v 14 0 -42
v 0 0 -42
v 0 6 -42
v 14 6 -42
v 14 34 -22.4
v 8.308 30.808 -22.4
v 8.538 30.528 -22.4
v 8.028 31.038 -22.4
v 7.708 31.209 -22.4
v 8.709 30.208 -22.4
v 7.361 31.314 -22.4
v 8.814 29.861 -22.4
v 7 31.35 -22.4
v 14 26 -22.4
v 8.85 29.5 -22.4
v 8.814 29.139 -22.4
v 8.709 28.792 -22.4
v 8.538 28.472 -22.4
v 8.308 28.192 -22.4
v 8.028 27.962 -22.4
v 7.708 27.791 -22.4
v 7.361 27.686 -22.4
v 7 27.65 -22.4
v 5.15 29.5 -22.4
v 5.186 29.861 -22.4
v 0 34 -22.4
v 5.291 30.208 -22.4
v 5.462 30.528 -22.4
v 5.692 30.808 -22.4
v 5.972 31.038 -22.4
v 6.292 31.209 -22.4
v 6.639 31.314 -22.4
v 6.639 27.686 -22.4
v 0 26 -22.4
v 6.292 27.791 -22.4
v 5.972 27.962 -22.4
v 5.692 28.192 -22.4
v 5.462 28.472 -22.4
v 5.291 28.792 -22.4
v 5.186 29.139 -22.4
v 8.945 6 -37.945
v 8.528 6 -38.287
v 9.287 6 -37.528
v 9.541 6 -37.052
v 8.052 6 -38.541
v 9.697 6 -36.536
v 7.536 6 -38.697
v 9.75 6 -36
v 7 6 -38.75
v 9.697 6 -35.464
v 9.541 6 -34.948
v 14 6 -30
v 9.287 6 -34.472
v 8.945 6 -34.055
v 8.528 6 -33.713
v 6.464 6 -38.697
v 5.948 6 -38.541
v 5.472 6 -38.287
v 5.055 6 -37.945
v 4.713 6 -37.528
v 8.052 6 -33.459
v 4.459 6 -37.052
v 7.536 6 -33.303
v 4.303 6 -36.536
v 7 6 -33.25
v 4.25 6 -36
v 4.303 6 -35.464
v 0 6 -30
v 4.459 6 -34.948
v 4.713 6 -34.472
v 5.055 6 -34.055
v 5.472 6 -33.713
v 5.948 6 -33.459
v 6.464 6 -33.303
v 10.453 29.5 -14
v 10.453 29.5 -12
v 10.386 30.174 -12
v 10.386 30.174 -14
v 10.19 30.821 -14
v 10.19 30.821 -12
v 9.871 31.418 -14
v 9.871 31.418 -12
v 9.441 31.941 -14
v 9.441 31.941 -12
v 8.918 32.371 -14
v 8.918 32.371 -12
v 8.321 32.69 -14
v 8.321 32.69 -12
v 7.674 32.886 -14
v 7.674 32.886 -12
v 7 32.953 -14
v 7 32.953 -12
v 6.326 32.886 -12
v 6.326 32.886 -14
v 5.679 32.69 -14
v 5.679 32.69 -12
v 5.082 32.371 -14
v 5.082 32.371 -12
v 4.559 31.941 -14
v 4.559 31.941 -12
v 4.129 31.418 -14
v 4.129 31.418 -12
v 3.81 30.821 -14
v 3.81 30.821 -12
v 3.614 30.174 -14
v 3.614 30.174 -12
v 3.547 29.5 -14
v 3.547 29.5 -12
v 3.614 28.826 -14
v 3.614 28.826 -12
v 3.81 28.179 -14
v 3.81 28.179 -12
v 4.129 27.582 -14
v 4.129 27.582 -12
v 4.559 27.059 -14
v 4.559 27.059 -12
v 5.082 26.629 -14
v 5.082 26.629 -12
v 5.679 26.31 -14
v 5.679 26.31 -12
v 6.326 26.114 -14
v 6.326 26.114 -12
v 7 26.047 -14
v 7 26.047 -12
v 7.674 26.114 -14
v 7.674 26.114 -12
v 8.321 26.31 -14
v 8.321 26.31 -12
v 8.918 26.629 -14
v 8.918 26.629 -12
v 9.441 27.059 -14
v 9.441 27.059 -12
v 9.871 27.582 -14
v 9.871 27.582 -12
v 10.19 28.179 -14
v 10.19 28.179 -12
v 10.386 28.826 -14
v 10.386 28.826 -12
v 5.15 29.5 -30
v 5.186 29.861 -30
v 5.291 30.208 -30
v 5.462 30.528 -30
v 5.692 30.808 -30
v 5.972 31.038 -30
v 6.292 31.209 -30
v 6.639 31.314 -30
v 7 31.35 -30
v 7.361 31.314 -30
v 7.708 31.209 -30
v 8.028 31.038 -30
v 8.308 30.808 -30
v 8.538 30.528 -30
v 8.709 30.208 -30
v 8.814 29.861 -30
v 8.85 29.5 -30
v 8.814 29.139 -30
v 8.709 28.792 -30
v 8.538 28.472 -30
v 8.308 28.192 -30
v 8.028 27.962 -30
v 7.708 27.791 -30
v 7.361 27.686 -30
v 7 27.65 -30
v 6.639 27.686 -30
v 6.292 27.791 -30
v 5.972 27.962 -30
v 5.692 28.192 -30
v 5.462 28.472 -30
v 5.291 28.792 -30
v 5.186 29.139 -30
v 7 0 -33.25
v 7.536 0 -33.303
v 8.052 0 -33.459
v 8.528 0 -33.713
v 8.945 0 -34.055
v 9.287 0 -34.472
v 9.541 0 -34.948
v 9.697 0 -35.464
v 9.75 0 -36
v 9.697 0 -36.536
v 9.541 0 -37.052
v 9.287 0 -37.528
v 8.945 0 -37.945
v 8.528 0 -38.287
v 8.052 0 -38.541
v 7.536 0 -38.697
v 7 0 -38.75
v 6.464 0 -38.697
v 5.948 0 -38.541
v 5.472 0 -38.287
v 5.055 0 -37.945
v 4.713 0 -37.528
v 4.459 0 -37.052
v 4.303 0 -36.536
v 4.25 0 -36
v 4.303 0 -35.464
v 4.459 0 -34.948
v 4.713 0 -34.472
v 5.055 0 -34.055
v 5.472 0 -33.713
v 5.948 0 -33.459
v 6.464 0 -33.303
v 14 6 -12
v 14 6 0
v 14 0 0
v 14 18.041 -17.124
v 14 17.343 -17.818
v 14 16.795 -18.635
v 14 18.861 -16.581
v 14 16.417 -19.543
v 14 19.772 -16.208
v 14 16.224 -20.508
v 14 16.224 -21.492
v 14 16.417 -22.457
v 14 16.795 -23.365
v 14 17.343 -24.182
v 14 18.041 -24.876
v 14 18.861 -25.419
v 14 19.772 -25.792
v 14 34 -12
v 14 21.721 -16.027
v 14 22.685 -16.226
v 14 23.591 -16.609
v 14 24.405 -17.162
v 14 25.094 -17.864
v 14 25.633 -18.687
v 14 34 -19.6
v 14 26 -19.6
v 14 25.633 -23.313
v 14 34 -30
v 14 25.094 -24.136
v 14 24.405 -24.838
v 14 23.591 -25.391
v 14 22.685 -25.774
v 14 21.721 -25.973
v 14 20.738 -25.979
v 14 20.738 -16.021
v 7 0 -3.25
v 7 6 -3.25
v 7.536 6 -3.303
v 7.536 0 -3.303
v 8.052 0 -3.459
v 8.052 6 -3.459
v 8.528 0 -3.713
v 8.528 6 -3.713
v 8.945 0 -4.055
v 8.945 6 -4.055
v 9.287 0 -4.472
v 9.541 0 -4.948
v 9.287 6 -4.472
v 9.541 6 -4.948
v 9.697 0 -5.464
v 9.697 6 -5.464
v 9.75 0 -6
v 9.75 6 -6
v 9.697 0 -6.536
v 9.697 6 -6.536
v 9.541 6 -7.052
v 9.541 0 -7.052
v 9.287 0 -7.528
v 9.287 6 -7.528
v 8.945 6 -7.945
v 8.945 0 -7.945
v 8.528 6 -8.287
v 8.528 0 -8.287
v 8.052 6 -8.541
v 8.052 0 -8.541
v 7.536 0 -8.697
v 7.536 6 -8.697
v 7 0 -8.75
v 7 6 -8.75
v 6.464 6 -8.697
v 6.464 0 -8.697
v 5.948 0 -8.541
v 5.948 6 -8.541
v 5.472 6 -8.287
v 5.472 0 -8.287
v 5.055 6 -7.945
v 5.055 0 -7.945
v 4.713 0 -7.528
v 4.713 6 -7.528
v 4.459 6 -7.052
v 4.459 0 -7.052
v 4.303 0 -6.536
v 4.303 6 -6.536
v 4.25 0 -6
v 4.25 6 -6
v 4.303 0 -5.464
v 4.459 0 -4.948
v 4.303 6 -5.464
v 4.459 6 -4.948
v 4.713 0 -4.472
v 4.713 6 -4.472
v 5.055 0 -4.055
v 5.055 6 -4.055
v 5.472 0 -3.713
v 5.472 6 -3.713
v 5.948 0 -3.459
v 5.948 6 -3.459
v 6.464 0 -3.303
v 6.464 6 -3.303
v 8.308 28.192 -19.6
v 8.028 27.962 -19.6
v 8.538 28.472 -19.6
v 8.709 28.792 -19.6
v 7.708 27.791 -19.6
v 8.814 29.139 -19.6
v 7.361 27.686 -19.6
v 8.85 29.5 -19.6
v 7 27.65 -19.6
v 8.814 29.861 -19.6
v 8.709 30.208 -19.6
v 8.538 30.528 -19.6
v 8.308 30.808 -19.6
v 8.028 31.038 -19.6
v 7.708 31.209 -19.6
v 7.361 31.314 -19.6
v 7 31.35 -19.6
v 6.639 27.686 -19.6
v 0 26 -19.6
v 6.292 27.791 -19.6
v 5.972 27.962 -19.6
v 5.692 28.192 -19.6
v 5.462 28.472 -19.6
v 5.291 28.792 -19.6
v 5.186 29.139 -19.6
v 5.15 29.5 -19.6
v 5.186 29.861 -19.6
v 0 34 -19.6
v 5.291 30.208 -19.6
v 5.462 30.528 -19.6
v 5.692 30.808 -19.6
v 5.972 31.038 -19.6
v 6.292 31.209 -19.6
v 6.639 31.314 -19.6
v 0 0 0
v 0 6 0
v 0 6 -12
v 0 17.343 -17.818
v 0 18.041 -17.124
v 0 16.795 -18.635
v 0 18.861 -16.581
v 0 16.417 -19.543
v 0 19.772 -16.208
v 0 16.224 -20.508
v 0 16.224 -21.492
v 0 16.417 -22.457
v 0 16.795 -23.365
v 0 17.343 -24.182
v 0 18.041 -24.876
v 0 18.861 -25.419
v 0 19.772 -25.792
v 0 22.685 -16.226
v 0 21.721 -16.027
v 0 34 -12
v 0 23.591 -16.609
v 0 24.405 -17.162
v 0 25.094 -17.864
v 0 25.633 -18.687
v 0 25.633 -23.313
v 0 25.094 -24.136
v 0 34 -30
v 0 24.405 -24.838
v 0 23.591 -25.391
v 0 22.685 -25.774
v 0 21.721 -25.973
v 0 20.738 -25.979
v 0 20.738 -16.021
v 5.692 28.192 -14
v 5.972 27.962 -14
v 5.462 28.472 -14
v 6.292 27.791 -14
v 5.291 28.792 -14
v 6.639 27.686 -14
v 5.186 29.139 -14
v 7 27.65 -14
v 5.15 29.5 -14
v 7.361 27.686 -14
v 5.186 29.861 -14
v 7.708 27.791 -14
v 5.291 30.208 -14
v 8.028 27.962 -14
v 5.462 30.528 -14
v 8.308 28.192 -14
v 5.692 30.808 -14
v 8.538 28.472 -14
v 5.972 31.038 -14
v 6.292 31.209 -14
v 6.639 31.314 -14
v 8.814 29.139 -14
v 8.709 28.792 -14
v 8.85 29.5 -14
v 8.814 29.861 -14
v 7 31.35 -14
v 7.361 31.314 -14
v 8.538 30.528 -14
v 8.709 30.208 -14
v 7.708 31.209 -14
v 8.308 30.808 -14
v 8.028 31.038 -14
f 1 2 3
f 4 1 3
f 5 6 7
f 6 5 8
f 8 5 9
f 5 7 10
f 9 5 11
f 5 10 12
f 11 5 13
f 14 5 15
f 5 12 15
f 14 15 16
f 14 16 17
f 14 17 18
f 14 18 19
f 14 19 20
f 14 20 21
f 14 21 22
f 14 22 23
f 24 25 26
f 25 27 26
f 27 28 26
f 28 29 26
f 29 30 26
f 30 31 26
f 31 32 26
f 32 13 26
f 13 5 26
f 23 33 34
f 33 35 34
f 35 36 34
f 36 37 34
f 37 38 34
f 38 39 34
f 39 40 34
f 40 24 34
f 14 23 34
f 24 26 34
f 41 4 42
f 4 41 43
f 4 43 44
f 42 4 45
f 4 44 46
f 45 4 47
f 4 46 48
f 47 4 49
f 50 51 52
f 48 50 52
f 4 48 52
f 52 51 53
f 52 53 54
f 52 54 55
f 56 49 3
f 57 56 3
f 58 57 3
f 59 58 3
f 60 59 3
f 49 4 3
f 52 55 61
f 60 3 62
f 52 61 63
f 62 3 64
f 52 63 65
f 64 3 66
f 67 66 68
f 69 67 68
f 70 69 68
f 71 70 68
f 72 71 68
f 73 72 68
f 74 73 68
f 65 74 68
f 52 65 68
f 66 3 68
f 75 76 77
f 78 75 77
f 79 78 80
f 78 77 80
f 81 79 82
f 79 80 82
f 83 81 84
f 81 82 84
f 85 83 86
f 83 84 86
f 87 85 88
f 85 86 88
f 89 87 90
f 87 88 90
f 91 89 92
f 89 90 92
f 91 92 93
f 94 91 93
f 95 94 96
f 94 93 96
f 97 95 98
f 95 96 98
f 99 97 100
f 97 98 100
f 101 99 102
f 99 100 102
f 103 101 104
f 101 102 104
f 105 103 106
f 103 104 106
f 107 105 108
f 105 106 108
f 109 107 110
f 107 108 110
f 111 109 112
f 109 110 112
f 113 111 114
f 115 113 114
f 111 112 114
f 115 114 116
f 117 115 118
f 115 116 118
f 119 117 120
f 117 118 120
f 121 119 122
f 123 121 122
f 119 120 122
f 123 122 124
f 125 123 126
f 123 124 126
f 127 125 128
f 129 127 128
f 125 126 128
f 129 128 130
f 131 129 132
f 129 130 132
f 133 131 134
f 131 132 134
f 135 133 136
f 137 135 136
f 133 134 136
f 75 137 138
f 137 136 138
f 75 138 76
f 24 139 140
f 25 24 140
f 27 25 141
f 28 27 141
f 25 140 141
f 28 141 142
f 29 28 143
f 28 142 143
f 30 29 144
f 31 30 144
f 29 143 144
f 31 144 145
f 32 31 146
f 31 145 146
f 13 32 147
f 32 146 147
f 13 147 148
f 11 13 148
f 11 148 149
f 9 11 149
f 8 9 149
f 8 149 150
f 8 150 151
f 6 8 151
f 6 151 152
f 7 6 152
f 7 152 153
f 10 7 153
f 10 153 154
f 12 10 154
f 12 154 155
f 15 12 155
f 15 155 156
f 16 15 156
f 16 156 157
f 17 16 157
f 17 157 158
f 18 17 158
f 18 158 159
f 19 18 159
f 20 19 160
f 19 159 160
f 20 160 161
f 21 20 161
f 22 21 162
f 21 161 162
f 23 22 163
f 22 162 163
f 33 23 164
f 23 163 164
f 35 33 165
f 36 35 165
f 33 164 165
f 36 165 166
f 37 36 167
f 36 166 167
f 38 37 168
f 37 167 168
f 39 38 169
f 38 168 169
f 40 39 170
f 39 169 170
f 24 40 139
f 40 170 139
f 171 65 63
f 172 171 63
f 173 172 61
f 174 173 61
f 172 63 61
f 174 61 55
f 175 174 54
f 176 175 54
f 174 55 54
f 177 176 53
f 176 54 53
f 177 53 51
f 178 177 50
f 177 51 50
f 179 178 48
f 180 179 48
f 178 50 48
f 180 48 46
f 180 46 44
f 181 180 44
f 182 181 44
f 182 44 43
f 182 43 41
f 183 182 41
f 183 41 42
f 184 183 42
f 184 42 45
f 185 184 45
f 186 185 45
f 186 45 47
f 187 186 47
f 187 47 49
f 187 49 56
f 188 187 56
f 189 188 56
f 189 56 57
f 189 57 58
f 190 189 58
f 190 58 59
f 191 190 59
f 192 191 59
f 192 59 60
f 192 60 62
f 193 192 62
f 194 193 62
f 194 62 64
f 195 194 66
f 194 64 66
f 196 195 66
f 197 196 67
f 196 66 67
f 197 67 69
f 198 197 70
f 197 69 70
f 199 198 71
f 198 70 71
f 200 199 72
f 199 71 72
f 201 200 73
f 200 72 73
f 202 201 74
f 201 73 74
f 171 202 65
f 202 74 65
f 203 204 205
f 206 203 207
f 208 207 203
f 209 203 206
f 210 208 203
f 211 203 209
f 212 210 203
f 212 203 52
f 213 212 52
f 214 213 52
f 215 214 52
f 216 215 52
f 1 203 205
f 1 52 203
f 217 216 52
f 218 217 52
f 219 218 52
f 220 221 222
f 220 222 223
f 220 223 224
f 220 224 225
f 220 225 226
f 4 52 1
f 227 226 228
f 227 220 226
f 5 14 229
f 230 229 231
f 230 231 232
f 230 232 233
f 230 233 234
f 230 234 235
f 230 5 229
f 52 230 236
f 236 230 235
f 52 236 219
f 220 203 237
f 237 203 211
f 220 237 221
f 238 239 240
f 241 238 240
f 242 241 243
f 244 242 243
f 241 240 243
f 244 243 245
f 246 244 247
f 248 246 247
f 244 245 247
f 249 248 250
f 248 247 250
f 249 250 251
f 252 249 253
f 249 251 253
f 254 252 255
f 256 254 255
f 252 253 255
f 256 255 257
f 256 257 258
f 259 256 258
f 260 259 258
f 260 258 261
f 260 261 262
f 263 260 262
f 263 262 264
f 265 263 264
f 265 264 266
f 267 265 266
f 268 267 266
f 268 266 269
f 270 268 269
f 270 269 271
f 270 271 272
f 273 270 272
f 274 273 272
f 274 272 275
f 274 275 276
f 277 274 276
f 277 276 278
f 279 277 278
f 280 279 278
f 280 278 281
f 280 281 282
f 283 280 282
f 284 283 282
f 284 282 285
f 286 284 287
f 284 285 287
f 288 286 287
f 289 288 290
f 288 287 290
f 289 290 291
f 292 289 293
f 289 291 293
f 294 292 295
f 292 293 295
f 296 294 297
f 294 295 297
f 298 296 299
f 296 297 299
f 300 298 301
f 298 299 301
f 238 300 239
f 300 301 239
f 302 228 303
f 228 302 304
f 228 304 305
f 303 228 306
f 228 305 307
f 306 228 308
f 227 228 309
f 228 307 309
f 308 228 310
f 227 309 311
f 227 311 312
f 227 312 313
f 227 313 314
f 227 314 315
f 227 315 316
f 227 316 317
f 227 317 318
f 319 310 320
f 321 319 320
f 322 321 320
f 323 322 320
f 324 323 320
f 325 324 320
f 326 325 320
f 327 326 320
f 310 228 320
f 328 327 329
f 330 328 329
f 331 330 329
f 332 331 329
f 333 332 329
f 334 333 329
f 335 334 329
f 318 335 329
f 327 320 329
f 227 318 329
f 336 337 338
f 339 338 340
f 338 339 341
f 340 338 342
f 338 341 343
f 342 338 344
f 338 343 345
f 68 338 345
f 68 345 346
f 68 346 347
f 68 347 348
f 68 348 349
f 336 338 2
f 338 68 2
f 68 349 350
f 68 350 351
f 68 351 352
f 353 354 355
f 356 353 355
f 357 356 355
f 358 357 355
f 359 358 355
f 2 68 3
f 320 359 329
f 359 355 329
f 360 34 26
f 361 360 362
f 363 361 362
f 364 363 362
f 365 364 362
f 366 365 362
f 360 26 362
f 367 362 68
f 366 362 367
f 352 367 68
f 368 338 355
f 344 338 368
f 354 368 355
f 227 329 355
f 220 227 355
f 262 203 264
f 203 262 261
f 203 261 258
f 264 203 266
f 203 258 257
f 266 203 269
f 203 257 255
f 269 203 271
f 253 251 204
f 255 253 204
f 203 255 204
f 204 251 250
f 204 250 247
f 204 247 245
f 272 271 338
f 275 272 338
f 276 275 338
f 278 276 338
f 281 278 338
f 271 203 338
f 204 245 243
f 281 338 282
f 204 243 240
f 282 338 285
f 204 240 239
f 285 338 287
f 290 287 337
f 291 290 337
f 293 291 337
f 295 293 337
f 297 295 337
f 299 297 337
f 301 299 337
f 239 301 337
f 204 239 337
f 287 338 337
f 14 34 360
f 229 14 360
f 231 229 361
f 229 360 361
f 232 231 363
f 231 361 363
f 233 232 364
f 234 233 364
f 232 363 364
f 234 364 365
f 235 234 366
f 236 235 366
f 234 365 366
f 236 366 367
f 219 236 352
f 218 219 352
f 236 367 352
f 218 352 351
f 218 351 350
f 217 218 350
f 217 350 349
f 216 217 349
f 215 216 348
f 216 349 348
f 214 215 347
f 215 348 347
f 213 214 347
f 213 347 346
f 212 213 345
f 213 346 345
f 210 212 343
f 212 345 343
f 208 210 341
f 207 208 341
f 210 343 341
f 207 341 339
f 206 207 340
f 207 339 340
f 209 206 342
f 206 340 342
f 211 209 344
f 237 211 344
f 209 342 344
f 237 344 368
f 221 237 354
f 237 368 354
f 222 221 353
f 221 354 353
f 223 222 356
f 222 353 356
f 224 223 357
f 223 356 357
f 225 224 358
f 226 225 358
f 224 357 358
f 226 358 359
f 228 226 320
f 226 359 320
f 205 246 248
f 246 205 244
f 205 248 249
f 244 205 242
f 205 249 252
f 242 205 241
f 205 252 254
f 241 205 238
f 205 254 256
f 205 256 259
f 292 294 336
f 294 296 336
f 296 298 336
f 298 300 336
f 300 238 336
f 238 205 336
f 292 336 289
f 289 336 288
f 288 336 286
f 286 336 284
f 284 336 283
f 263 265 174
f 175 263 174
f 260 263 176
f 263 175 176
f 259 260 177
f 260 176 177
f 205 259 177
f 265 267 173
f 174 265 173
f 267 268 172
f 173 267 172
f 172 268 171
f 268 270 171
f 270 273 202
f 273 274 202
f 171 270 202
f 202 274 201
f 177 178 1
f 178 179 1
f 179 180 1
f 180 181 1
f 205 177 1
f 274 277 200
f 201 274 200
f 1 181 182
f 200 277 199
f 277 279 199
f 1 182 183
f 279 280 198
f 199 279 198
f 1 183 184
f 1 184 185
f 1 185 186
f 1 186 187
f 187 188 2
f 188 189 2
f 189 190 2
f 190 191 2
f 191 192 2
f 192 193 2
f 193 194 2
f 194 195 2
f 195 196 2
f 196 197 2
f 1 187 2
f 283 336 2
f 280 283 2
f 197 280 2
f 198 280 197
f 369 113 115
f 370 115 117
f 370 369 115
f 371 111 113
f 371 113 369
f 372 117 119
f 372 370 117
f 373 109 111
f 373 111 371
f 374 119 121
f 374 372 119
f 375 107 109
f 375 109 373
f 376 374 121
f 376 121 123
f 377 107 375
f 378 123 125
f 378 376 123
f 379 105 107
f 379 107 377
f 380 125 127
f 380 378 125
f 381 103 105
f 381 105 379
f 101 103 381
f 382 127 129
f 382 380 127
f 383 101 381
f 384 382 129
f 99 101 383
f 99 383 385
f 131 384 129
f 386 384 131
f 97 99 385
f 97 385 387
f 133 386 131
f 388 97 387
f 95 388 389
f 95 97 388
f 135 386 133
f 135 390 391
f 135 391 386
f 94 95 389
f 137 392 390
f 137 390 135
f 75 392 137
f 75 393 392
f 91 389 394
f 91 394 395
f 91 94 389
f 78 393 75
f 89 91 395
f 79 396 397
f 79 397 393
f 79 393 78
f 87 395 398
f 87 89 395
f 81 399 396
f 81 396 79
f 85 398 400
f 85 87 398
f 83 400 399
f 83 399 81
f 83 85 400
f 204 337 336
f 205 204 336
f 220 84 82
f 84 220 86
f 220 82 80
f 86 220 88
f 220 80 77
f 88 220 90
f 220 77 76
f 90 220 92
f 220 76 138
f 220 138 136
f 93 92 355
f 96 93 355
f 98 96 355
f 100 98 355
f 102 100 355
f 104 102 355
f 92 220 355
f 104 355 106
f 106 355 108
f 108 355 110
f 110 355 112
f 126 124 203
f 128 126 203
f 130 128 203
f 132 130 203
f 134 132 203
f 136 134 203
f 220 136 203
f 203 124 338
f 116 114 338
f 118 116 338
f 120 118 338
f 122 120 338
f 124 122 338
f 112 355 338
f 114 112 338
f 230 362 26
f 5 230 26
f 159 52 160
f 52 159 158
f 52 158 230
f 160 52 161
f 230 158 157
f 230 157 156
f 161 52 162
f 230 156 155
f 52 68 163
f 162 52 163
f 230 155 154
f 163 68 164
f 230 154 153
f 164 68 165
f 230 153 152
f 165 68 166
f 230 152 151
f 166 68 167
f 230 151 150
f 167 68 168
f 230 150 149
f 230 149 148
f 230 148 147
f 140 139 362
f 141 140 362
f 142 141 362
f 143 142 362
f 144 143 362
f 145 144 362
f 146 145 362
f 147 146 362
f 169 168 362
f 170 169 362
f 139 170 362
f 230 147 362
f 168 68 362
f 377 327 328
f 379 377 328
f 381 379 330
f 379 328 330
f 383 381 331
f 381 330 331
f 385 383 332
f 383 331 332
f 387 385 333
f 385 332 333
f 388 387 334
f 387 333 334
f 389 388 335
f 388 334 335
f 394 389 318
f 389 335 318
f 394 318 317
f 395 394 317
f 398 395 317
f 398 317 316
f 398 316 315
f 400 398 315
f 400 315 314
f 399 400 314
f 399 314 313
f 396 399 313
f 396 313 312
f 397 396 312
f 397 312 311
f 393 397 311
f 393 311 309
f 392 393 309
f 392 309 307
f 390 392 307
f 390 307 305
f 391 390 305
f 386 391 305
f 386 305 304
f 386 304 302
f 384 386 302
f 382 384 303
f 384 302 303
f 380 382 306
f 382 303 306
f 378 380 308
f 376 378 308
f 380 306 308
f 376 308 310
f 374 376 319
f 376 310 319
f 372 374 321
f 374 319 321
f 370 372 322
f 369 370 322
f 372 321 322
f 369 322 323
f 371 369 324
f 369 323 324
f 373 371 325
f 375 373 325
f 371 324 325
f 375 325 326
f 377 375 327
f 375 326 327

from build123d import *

# Parameters (mm, degrees)
BOSS_EXTRUDE1_DEPTH = 14
SKETCH3_R           = 1.85
CUT_EXTRUDE1_DEPTH  = 48.455242071
SKETCH4_R           = 2.75
CUT_EXTRUDE2_DEPTH  = 53.383203415
SKETCH5_R           = 3.452522479
CUT_EXTRUDE3_DEPTH  = 2


with BuildPart() as part:
    # Sketch2 → Boss-Extrude1 (new body)
    with BuildSketch(Plane(origin=(0, 0, 0), x_dir=(0, 0, -1), z_dir=(1, 0, 0))):
        with BuildLine():
            Line((0, 0), (42, 0))
            Line((42, 0), (42, 6))
            Line((42, 6), (30, 6))
            Line((30, 6), (30, 34))
            Line((30, 34), (22.4, 34))
            Line((22.4, 34), (22.4, 26))
            ThreePointArc((22.4, 26), (21, 16.2), (19.6, 26))
            Line((19.6, 26), (19.6, 34))
            Line((19.6, 34), (12, 34))
            Line((12, 34), (12, 6))
            Line((12, 6), (0, 6))
            Line((0, 6), (0, 0))
        make_face()
    extrude(amount=BOSS_EXTRUDE1_DEPTH)

    # Sketch3 → Cut-Extrude1 (cut, through all)
    with BuildSketch(Plane(origin=(0, 0, -30), x_dir=(-1, 0, 0), z_dir=(0, 0, -1))):
        with Locations((-7, 29.5)):
            Circle(SKETCH3_R)
    extrude(amount=-CUT_EXTRUDE1_DEPTH, mode=Mode.SUBTRACT)

    # Sketch4 → Cut-Extrude2 (cut, through all)
    with BuildSketch(Plane(origin=(0, 6, 0), x_dir=(1, 0, 0), z_dir=(0, 1, 0))):
        with Locations(Location((7, 36, 0), (0, 0, 270))):
            Circle(SKETCH4_R)
        with Locations(Location((7, 6, 0), (0, 0, 270))):
            Circle(SKETCH4_R)
    extrude(amount=-CUT_EXTRUDE2_DEPTH, mode=Mode.SUBTRACT)

    # Sketch5 → Cut-Extrude3 (cut)
    with BuildSketch(Plane.XY.offset(-12)):
        with Locations((7, 29.5)):
            Circle(SKETCH5_R)
    extrude(amount=-CUT_EXTRUDE3_DEPTH, mode=Mode.SUBTRACT)


solid = part.part
